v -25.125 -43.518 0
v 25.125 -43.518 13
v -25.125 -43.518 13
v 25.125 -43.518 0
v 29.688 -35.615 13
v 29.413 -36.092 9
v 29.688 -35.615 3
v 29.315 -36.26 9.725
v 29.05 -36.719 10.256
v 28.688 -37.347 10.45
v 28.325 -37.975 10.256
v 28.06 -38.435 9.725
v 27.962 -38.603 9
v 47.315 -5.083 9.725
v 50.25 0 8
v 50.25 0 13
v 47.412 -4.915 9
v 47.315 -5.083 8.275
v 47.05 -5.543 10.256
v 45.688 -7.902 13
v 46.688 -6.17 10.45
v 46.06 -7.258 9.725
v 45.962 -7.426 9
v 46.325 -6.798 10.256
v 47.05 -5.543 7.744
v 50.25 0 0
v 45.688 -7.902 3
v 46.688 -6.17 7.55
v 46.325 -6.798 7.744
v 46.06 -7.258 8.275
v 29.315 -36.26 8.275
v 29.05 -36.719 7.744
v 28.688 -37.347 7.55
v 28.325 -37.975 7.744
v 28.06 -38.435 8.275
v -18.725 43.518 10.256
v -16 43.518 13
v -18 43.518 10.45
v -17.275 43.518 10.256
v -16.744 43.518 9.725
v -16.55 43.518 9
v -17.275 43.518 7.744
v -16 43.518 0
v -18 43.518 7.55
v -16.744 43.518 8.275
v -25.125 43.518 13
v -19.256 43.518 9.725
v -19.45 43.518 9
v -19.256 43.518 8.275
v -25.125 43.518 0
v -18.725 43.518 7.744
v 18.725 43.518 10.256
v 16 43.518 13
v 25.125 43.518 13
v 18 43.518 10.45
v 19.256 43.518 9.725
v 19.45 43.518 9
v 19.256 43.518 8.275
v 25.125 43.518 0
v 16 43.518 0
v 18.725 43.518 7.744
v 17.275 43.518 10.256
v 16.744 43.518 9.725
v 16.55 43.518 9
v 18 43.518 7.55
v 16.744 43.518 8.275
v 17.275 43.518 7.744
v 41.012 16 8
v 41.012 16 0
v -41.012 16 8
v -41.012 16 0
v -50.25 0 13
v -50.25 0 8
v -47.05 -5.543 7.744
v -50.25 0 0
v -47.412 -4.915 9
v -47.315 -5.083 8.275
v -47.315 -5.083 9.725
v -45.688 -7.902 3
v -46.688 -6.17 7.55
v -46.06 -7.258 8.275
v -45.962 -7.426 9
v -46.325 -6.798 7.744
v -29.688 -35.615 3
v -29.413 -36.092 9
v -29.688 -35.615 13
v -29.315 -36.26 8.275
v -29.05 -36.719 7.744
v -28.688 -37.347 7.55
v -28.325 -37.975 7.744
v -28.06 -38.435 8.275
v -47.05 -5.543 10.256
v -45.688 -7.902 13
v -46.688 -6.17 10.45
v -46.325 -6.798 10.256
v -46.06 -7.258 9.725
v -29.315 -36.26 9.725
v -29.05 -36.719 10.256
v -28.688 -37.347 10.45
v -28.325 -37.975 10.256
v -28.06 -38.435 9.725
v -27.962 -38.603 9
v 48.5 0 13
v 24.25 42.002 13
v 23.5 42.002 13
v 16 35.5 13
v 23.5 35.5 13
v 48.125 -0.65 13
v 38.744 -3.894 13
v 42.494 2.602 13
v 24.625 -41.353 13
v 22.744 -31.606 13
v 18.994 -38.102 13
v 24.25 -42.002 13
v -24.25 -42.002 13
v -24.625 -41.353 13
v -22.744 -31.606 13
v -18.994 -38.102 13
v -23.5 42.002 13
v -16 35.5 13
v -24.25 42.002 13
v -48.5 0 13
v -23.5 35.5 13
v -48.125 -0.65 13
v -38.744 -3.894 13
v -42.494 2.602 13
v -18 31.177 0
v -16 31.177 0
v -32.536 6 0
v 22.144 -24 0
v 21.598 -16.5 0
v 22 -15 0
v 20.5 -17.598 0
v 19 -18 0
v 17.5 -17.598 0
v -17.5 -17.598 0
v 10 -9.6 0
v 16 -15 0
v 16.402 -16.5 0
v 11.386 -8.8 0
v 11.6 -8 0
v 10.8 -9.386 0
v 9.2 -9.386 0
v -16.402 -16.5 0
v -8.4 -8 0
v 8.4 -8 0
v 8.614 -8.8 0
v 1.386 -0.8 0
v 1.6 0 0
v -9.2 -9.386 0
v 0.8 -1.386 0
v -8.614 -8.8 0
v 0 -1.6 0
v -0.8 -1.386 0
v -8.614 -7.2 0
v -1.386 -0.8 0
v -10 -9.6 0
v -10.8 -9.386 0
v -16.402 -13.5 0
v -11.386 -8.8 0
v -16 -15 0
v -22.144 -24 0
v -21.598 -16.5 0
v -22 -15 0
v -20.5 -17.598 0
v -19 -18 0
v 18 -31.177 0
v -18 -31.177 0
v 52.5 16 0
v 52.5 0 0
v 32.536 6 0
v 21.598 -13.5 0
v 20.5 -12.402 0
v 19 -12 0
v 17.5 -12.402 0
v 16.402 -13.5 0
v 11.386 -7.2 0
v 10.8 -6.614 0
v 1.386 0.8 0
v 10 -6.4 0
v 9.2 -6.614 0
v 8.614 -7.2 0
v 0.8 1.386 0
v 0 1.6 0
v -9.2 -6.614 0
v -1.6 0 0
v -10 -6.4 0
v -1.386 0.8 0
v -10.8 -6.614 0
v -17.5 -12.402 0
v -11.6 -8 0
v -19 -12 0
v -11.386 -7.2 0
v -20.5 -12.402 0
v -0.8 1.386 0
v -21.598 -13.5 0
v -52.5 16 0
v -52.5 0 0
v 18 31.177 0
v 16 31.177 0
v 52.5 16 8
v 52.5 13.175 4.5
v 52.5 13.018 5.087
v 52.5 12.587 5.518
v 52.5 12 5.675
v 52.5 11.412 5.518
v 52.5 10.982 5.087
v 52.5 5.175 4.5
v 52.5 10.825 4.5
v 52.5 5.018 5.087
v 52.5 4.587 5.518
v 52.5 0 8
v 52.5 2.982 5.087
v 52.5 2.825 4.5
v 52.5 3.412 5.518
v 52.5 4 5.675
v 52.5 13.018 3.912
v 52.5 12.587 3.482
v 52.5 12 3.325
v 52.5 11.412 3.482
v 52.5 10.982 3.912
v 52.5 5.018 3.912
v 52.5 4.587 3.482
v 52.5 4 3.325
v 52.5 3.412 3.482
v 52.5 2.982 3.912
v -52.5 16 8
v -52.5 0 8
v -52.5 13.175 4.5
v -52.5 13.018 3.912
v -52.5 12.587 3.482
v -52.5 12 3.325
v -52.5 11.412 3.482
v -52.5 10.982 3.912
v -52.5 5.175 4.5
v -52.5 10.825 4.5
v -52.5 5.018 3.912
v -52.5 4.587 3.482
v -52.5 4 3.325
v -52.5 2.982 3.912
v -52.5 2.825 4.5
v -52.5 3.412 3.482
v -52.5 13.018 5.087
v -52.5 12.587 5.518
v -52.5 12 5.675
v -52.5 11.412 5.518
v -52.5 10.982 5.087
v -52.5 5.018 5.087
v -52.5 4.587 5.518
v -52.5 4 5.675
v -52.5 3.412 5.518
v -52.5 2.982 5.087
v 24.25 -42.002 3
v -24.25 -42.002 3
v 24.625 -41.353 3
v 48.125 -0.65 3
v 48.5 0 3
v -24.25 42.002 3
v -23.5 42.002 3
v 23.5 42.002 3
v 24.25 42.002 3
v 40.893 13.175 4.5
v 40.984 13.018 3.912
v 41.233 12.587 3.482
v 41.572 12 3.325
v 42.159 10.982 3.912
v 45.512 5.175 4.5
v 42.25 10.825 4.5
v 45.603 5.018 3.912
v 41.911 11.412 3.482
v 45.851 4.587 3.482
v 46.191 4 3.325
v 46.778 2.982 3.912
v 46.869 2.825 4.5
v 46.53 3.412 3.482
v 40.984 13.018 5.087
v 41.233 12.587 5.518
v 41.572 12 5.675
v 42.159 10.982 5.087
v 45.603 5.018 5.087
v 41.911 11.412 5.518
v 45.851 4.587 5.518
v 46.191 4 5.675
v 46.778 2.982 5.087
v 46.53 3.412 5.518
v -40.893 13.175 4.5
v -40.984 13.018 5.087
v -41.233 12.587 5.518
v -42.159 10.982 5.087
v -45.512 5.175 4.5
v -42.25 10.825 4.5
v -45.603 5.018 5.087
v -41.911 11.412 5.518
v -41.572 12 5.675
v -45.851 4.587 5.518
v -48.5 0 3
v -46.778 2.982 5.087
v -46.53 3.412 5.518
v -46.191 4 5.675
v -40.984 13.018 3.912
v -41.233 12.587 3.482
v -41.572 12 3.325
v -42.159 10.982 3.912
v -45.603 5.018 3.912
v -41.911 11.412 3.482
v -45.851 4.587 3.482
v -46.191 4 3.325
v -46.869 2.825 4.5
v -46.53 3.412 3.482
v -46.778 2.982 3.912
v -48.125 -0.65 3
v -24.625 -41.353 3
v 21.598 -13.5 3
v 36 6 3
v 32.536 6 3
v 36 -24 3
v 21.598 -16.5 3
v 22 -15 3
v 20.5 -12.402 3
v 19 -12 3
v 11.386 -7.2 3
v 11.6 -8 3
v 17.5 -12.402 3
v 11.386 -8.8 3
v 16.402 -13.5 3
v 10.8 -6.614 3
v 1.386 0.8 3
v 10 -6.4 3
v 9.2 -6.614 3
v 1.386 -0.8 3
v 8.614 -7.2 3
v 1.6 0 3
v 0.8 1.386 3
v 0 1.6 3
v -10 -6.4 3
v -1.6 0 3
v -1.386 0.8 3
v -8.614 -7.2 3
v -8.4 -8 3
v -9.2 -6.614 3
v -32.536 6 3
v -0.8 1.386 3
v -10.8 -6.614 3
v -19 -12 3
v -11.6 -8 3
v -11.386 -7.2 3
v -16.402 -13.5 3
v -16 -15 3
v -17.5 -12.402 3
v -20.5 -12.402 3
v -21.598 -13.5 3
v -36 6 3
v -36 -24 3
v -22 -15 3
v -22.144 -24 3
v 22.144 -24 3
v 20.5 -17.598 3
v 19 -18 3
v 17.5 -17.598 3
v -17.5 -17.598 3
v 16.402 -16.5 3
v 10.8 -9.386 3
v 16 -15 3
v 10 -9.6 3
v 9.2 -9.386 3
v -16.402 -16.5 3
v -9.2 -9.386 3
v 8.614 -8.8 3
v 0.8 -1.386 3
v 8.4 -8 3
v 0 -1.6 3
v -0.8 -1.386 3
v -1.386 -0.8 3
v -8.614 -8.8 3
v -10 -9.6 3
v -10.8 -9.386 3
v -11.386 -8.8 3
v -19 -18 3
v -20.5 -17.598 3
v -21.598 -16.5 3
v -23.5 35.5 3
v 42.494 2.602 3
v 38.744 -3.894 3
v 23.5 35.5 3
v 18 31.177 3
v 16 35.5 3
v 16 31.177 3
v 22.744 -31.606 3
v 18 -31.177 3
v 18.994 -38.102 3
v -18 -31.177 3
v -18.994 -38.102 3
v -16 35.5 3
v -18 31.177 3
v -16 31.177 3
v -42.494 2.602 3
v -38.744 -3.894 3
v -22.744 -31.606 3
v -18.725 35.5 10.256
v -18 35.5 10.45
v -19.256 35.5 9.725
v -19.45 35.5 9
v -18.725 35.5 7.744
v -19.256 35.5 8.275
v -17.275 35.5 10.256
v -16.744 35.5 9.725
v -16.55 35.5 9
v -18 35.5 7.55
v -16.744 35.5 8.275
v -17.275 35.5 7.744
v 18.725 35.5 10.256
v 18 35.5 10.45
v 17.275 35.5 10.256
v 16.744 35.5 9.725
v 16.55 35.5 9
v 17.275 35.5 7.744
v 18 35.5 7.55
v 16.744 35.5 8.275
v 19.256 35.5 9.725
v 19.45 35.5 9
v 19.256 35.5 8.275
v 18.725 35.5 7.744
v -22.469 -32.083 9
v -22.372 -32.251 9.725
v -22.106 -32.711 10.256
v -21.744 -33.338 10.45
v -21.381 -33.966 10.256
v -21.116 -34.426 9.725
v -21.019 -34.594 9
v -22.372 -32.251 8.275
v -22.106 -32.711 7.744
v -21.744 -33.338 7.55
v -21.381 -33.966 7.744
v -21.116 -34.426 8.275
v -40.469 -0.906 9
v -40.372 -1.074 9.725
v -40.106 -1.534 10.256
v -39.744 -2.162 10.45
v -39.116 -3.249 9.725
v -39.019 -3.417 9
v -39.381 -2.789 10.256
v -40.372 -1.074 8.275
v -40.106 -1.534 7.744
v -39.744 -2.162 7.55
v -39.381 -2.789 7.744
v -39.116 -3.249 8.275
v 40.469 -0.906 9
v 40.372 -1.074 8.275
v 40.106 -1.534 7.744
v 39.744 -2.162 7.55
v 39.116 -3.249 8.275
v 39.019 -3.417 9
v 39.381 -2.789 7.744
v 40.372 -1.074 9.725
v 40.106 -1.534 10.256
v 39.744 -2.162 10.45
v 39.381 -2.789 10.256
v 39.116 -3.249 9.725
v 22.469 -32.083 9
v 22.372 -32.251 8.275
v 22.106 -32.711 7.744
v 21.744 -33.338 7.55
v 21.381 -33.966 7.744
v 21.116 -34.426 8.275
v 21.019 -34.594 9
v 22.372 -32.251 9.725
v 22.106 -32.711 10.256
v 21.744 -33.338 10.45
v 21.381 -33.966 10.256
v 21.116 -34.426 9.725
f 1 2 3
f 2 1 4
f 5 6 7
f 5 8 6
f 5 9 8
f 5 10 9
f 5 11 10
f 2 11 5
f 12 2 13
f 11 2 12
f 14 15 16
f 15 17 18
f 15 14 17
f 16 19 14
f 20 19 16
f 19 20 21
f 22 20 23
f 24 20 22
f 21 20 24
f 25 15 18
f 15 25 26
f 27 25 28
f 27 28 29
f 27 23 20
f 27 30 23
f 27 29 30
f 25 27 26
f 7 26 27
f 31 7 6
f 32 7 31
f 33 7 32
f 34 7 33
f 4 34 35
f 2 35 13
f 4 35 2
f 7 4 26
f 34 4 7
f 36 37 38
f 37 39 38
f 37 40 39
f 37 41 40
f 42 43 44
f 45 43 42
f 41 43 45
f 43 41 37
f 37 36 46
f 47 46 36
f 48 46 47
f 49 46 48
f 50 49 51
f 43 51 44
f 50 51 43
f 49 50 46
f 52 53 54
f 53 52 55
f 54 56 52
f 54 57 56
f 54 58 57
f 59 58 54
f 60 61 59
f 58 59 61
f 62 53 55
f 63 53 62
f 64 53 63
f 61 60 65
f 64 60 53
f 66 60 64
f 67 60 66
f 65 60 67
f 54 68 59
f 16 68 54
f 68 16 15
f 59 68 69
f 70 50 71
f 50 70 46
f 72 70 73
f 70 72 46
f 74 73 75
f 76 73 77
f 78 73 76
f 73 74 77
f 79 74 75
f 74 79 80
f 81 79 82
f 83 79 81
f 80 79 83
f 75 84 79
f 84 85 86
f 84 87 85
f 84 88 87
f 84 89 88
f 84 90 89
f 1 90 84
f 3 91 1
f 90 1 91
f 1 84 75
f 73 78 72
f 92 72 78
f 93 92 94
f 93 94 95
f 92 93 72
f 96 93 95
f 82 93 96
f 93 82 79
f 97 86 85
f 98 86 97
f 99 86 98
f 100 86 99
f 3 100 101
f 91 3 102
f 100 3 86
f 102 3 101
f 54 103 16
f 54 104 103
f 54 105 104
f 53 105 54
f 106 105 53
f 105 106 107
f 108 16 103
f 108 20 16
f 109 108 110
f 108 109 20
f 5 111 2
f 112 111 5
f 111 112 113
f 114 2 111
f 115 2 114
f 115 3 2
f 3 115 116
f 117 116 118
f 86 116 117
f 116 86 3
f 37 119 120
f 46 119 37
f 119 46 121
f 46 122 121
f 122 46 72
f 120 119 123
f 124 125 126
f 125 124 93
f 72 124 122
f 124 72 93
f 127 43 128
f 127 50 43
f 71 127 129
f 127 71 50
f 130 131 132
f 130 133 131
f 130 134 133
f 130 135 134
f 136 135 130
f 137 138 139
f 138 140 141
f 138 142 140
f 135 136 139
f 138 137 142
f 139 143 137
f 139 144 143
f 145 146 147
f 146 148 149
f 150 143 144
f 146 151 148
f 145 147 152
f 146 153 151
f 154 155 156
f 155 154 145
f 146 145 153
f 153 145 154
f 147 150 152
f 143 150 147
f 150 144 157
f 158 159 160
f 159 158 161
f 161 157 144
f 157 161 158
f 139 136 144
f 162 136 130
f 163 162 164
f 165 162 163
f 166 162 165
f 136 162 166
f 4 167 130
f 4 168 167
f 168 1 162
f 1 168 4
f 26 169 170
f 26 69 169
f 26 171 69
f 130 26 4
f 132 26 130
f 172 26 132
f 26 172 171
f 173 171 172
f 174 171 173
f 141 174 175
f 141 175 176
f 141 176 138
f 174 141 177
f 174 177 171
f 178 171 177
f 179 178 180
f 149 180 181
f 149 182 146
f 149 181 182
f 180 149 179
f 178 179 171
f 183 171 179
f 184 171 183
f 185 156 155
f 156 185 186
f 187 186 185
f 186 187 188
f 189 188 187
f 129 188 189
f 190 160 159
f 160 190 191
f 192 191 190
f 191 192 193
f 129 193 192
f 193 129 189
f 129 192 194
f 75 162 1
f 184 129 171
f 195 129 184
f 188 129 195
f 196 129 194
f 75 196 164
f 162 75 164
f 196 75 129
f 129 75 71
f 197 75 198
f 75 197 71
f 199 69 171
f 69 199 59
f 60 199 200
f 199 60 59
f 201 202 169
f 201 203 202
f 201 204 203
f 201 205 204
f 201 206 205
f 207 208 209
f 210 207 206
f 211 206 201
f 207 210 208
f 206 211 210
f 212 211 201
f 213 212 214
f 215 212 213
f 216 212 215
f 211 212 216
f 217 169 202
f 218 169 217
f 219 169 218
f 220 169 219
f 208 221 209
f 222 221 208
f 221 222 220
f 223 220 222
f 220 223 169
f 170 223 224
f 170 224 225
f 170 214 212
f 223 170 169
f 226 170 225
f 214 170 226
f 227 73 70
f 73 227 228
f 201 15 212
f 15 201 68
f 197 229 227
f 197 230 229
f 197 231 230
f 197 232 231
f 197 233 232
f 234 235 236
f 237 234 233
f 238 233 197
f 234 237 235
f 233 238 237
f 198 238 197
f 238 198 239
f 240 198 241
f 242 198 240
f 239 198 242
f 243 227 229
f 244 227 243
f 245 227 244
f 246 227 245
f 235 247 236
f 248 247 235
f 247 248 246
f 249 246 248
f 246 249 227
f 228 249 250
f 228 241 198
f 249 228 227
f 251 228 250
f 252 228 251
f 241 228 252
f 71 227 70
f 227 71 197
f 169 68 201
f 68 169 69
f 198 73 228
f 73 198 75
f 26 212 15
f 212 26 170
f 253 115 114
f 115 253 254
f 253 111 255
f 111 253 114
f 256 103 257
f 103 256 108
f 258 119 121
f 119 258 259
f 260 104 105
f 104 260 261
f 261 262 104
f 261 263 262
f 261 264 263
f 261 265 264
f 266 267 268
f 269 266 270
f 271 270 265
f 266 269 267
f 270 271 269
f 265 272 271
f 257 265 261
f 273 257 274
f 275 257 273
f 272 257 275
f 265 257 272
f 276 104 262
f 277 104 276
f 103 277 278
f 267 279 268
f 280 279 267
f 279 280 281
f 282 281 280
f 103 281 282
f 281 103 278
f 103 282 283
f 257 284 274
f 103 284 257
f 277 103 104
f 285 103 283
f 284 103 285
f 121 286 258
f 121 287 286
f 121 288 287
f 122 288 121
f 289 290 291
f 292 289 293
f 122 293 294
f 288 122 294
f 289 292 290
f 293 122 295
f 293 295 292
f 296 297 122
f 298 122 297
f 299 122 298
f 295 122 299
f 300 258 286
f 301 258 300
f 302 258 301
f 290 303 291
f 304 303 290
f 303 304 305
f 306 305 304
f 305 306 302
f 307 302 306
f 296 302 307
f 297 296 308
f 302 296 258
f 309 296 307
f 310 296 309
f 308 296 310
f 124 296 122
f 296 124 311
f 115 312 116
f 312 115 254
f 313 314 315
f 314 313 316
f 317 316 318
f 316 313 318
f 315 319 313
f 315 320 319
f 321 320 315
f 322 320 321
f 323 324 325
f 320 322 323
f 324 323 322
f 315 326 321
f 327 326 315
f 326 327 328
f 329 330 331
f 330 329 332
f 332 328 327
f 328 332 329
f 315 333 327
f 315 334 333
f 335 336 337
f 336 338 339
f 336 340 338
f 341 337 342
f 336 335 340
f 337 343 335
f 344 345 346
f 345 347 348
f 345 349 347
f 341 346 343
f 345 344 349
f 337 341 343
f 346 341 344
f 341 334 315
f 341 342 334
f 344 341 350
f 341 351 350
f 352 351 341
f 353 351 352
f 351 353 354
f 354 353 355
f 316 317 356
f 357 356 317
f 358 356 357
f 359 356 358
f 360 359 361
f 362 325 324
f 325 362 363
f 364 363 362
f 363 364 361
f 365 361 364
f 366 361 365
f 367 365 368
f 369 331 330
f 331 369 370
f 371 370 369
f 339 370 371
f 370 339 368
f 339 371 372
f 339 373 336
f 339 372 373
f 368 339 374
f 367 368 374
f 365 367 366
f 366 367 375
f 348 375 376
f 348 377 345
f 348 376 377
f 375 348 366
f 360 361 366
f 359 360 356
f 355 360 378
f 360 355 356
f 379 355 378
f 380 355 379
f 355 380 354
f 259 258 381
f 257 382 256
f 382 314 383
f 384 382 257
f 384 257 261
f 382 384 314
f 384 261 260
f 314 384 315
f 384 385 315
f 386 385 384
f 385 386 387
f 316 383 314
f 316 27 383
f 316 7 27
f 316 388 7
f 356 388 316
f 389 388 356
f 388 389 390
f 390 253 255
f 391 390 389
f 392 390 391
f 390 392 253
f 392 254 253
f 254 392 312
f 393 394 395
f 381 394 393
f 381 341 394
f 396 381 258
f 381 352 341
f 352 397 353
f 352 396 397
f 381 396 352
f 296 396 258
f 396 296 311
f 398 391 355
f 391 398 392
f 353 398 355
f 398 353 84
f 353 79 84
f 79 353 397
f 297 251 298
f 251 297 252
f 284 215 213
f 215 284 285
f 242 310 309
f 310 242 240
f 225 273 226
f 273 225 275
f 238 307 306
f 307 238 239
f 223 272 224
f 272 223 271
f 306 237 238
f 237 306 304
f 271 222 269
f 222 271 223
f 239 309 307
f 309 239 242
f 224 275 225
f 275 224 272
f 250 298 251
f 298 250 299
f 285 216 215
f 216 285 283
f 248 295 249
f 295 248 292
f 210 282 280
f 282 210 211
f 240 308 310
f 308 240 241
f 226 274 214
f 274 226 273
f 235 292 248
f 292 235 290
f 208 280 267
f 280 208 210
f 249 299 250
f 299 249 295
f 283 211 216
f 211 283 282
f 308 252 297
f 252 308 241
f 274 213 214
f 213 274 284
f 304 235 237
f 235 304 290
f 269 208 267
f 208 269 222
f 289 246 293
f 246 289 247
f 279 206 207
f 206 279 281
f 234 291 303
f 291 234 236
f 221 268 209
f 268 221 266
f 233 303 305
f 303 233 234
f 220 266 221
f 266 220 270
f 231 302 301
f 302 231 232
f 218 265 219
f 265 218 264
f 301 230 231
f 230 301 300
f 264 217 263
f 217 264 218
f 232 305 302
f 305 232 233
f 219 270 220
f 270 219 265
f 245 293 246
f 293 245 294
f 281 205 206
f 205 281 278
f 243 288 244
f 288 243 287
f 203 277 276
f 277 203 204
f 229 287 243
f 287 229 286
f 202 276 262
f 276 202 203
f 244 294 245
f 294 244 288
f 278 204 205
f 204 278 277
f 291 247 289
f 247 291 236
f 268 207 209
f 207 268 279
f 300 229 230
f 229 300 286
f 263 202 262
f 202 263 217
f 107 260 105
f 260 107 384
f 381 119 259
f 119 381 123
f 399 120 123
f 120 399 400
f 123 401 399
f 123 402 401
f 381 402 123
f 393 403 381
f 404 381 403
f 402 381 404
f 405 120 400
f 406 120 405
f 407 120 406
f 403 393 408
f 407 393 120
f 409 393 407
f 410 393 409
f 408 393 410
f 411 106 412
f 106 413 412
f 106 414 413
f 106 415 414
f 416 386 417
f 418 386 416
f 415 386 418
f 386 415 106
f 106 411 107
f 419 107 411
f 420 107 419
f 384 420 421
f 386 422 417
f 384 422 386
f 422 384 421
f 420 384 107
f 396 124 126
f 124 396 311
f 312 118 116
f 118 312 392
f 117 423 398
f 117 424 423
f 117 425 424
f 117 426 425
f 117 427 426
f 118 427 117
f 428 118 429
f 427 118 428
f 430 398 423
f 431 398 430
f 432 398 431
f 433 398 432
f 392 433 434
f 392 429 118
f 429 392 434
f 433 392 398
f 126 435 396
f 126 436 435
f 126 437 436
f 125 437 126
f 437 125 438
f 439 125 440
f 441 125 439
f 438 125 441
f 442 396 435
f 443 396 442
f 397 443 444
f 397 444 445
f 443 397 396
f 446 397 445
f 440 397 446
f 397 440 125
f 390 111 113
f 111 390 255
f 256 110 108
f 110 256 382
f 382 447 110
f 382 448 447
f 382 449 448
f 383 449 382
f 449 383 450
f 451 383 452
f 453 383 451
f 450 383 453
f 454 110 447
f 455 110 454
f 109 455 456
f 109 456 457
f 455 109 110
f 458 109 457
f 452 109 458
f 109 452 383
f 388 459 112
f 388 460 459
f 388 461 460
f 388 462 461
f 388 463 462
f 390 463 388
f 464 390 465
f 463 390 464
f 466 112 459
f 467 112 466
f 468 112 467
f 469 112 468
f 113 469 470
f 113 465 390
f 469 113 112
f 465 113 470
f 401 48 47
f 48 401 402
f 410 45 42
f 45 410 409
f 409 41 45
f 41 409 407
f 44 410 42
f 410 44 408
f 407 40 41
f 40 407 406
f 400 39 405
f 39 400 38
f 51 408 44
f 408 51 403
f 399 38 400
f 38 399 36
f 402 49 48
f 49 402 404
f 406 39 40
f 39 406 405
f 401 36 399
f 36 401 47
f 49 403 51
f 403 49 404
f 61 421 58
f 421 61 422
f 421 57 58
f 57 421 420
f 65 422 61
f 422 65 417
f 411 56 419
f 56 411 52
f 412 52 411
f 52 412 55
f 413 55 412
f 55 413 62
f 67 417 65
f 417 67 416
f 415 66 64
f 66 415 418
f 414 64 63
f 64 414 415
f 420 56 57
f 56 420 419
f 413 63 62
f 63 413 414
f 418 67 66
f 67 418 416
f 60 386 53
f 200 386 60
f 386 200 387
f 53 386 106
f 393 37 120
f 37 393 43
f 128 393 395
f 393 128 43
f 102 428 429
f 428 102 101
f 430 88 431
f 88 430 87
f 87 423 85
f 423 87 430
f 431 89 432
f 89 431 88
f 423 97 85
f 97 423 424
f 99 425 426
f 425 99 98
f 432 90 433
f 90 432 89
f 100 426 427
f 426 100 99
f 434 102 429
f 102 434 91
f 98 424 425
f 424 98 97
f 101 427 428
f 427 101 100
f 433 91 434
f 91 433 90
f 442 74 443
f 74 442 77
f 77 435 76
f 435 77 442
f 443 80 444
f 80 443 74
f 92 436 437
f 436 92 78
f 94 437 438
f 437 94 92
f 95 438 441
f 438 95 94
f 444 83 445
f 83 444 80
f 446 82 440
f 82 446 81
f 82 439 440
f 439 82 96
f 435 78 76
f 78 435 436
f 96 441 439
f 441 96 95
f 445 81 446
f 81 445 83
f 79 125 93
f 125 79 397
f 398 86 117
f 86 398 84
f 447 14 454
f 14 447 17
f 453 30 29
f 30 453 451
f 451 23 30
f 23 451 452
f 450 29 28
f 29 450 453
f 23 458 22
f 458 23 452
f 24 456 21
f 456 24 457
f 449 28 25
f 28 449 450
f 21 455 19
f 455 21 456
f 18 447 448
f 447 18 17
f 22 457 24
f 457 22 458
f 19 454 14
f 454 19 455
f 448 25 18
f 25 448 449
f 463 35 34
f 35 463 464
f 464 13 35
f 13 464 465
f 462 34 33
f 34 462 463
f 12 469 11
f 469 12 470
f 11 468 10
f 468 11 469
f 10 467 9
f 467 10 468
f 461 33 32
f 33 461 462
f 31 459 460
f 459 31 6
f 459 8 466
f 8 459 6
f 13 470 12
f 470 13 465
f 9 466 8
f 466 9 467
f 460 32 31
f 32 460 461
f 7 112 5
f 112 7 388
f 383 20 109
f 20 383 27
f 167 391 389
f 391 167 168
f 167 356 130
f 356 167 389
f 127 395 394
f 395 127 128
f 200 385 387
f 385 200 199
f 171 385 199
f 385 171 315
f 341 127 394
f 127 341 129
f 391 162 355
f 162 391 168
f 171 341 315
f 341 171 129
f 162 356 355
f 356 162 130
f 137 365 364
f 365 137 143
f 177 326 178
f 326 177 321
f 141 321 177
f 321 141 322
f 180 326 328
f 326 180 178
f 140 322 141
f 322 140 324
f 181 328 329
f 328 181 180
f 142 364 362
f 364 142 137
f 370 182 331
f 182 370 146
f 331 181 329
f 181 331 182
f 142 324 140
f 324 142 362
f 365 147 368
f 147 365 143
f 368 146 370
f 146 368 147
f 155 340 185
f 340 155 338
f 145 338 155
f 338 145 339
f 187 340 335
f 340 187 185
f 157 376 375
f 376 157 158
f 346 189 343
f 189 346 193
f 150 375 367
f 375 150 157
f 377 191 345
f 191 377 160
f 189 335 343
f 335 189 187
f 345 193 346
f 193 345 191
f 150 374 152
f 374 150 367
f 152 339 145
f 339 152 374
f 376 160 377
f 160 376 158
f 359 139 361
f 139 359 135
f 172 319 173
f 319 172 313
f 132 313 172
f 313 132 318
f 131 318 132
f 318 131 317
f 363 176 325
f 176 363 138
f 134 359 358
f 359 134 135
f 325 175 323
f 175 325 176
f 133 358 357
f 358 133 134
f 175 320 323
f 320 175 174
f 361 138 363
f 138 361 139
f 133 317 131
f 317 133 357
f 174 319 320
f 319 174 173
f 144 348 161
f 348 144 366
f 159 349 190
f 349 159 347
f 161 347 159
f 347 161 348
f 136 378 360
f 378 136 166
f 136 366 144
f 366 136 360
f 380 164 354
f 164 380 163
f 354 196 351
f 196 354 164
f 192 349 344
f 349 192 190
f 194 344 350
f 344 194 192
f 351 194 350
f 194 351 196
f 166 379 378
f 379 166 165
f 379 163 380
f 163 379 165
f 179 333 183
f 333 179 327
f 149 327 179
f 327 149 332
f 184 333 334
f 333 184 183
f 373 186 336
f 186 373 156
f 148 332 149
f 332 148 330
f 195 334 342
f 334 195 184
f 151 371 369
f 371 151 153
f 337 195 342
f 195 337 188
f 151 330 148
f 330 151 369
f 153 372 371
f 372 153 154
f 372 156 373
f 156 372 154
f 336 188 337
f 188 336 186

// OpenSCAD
$fn=12;
difference(){

union(){    
difference(){
union(){
cylinder(d=100.5,h=13,$fn=6);
translate([-52.5,0,0])cube([105,16,8]);
}
translate([0,0,3])cylinder(d=97,h=11,$fn=6);
translate([0,4,4.5])rotate([0,90,0])cylinder(d=2.35,h=200,center=true);
translate([0,12,4.5])rotate([0,90,0])cylinder(d=2.35,h=200,center=true);
}

    
for(i=[0:120:300]){
rotate([0,0,i])translate([0,39.5,7]) 
    cube([47,8,12],center=true);    
}
}
translate([0,0,-1])cylinder(d=72,h=14,$fn=6);    
    
for(i=[0:120:300]){
rotate([0,0,i]){
    translate([-18,0,9])rotate([-90,0,0])
    cylinder(d=2.9,h=100);
    translate([18,0,9])rotate([-90,0,0])
    cylinder(d=2.9,h=100);
    translate([-16,0,3])cube([32,120,11]);
}
}
translate([-16,0,-1])cube([32,120,11]);
}

difference(){
translate([0,-9,1.5])cube([72,30,3],center=true);
translate([10,-8,-1])cylinder(d=3.2,h=5);
translate([-10,-8,-1])cylinder(d=3.2,h=5);
translate([19,-15,-1])cylinder(d=6,h=5);
translate([-19,-15,-1])cylinder(d=6,h=5);
cylinder(d=3.2,h=4);    
}
